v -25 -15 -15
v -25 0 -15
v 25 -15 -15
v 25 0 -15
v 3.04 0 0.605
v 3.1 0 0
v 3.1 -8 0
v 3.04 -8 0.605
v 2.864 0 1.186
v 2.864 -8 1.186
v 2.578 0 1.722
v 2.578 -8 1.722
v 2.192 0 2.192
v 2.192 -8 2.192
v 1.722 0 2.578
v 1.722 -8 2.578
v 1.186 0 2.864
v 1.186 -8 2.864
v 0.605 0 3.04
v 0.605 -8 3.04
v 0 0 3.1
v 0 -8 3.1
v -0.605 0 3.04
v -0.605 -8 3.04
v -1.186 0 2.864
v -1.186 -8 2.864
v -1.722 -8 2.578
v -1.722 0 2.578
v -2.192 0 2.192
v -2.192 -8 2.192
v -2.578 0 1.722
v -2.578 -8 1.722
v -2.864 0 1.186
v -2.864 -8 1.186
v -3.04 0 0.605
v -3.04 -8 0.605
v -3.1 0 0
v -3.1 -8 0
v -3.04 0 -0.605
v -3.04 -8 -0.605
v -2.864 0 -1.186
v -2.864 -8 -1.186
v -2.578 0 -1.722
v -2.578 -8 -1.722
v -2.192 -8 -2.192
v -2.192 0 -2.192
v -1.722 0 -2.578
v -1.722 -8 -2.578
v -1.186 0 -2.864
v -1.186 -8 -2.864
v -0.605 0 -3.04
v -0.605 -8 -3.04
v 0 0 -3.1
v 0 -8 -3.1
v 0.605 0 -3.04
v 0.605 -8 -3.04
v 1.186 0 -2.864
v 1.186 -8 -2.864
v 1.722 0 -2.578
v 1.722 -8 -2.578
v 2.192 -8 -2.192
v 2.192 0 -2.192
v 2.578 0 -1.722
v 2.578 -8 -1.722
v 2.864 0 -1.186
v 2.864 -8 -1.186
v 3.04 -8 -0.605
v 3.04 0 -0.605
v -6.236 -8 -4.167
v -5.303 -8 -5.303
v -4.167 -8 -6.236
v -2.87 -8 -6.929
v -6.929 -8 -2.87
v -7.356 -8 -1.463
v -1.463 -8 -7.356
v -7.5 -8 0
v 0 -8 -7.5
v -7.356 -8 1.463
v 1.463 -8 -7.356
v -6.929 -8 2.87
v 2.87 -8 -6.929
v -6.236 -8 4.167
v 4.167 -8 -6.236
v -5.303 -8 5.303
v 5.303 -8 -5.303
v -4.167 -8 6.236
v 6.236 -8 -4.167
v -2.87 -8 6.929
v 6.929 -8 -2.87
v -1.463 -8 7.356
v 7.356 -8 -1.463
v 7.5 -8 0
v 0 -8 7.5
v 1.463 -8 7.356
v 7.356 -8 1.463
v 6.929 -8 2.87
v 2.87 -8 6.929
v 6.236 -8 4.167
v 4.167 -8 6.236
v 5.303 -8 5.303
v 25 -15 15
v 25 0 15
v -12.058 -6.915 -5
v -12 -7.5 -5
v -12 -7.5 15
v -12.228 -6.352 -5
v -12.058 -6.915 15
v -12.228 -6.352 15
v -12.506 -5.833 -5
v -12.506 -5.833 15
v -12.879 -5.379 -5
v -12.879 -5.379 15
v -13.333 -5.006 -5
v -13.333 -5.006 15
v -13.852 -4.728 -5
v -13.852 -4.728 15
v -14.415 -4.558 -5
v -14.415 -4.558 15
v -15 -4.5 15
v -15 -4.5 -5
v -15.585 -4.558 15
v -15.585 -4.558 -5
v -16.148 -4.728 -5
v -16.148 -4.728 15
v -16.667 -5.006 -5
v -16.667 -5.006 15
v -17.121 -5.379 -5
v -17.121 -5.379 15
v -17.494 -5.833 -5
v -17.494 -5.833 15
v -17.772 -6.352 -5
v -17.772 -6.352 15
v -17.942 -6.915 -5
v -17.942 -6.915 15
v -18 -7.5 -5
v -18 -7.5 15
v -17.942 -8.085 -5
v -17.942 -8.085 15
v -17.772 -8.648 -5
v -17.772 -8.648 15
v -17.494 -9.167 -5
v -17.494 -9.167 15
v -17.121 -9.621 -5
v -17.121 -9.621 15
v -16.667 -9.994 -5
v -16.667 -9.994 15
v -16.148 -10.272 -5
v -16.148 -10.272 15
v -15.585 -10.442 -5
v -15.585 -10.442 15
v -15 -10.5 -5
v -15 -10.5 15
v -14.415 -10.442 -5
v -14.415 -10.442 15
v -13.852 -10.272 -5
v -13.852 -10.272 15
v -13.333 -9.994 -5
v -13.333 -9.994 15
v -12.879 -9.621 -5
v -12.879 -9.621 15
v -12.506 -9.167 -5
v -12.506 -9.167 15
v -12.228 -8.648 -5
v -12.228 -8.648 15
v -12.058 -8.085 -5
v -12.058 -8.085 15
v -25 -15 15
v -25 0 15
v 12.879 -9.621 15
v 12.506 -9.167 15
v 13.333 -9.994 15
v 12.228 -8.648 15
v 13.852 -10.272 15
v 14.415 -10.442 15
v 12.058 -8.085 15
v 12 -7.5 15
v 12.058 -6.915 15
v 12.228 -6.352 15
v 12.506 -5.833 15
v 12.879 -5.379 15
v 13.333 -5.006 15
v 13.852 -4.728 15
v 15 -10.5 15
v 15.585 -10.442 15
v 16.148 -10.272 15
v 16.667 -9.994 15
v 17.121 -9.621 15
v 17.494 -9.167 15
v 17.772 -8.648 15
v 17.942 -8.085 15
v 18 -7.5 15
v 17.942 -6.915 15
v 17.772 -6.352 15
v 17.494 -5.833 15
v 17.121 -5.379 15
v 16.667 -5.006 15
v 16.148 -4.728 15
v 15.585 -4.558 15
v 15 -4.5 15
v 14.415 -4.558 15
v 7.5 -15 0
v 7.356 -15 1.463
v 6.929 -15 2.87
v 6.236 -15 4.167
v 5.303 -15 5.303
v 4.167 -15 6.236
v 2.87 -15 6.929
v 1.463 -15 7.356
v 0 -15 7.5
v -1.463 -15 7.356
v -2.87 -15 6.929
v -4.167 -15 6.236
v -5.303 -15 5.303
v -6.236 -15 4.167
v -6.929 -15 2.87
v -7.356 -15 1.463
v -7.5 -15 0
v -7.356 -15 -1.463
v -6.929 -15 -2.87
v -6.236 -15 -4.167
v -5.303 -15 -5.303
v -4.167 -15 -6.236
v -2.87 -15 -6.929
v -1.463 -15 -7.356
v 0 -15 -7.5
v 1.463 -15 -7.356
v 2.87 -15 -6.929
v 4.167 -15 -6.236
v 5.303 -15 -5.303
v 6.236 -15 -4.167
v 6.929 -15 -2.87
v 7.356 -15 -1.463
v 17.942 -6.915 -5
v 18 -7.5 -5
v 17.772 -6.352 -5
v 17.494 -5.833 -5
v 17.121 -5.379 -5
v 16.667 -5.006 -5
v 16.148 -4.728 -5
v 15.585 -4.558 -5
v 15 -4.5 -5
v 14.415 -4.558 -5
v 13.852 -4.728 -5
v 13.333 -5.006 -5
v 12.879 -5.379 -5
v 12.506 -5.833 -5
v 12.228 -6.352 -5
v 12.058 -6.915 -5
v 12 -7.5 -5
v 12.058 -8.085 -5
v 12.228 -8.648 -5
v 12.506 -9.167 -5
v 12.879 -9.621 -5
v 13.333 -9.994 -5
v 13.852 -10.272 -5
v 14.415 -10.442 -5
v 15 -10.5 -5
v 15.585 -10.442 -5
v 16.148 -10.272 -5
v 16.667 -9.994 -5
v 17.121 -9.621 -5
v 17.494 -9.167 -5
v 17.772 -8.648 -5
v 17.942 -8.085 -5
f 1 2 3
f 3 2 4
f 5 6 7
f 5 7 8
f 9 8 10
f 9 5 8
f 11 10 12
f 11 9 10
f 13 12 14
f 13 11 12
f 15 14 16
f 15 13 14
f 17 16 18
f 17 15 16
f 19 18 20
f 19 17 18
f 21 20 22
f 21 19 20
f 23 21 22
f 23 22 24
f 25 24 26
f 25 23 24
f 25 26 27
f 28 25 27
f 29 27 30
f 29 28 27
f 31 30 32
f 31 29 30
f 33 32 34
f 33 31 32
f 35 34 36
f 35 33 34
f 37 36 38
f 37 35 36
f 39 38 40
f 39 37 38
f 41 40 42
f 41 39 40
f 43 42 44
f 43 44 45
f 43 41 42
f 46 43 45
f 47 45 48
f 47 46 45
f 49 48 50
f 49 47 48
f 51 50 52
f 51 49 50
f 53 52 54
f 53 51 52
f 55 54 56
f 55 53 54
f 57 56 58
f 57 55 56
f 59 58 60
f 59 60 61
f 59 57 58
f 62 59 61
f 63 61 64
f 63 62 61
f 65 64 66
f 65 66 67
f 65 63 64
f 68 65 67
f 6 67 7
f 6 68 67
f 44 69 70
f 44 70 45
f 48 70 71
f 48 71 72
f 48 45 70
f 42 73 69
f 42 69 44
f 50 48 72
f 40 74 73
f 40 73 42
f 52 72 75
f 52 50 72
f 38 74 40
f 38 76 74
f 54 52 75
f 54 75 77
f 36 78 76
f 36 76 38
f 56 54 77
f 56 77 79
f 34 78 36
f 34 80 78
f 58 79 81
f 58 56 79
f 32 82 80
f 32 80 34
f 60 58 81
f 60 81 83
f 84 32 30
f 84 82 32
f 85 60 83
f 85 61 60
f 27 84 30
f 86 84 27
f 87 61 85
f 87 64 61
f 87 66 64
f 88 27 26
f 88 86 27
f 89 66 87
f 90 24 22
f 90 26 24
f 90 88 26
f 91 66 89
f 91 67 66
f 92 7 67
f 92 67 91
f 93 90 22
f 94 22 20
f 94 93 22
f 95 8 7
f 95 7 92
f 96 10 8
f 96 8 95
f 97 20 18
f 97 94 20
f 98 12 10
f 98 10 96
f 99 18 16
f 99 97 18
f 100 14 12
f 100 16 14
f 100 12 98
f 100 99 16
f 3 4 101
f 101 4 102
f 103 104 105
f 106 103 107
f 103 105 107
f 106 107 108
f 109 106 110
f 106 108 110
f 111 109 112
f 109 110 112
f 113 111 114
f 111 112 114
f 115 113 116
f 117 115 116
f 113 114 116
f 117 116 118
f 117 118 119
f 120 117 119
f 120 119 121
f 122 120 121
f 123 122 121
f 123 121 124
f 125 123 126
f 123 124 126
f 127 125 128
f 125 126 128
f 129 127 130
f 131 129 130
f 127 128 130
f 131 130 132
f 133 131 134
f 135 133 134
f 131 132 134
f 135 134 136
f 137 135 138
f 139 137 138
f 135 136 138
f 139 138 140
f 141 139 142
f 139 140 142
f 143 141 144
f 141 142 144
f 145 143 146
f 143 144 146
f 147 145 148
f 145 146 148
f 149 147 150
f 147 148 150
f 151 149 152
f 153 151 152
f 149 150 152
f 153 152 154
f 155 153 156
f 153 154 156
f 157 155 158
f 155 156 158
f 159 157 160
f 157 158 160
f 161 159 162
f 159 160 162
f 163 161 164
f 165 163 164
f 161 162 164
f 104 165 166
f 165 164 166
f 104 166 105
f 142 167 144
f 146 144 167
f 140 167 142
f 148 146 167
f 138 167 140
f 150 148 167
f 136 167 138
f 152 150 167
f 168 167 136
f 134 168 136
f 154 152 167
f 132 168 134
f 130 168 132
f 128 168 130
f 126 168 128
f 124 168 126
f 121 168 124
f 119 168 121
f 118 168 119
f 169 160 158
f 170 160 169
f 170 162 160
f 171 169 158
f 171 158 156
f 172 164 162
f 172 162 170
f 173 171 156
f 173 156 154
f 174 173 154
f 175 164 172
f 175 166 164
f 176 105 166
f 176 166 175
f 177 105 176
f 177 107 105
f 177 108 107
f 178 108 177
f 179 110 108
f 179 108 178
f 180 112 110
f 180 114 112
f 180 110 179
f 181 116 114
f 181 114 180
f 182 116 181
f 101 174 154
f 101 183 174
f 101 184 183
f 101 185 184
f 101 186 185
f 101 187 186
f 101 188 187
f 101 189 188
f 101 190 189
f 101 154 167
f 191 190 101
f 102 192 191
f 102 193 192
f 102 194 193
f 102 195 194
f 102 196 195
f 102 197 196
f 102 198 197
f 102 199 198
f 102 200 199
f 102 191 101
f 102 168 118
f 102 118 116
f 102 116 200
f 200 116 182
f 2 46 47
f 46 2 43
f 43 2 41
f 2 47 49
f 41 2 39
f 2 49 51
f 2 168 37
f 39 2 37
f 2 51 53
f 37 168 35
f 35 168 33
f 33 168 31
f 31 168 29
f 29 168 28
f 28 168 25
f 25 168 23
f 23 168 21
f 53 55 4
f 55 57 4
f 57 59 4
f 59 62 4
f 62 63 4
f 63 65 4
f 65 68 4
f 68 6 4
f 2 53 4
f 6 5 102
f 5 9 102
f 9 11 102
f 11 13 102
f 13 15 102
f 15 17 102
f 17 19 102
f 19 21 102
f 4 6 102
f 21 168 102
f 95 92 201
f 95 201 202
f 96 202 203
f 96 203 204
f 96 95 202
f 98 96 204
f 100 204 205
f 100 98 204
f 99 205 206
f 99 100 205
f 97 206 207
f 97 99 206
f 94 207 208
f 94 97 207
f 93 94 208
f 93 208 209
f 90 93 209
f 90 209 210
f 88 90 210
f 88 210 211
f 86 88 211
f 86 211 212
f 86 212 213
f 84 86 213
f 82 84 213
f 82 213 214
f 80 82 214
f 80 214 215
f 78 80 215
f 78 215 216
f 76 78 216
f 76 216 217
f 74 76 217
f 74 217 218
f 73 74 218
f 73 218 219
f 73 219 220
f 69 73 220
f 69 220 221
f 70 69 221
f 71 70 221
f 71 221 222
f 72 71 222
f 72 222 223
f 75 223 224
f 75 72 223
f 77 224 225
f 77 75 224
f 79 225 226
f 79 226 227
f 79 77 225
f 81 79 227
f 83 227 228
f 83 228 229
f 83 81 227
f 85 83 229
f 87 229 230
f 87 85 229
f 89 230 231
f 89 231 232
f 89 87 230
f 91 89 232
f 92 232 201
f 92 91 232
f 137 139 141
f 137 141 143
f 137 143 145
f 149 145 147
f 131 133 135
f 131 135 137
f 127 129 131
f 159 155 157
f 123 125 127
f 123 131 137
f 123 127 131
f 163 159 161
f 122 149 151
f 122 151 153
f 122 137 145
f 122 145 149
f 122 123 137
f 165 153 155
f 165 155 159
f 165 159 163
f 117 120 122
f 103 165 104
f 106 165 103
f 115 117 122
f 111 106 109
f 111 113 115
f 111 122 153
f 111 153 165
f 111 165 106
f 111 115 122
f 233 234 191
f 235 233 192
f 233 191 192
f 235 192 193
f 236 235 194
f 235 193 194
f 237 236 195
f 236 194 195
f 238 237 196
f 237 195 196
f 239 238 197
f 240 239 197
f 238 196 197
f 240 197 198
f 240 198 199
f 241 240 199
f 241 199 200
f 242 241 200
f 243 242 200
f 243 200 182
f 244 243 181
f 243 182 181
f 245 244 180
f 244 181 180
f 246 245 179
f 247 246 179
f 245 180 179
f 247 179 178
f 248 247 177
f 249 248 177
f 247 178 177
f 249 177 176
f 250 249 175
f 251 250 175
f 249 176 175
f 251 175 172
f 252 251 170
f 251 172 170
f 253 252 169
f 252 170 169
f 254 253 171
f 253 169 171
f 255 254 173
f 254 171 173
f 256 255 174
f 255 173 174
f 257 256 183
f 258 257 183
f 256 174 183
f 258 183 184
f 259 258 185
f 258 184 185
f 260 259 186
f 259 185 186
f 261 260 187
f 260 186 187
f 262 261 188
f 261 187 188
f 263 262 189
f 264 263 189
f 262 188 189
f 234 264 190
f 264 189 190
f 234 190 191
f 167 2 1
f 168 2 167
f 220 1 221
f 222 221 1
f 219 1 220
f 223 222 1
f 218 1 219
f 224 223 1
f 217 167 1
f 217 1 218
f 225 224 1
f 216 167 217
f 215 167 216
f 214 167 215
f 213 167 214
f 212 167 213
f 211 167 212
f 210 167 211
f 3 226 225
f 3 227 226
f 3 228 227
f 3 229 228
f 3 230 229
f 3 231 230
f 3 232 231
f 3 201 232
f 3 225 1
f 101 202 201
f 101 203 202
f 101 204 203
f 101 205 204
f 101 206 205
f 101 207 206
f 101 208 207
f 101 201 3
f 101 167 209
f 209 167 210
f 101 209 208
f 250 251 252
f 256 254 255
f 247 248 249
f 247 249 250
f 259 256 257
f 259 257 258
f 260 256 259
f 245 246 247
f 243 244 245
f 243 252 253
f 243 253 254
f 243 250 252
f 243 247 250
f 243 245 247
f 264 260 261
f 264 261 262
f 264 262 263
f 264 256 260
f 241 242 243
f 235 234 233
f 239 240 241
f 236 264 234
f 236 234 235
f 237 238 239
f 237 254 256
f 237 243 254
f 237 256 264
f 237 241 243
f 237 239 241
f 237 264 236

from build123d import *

# Parameters (mm, degrees)
F0_W     = 50
F0_H     = 30
F0_R     = 7.5
F1_DEPTH = 15
F0_R_2   = 3.1
F2_DEPTH = 8
F3_R     = 3
F4_DEPTH = 20


with BuildPart() as f1:
    # F0 (on Front) → F1 (new body)
    with BuildSketch(Plane.XZ):
        Rectangle(F0_W, F0_H)
        Circle(F0_R, mode=Mode.SUBTRACT)
    extrude(amount=F1_DEPTH)

    # F0 (on Front) → F2 (join)
    with BuildSketch(Plane.XZ):
        Circle(F0_R)
        Circle(F0_R_2, mode=Mode.SUBTRACT)
    extrude(amount=F2_DEPTH)

    # F3 (on face) → F4 (cut)
    with BuildSketch(Plane.XY.offset(15)):
        with Locations((-15, -7.5)):
            Circle(F3_R)
        with Locations((15, -7.5)):
            Circle(F3_R)
    extrude(amount=-F4_DEPTH, mode=Mode.SUBTRACT)


solid = f1.part
